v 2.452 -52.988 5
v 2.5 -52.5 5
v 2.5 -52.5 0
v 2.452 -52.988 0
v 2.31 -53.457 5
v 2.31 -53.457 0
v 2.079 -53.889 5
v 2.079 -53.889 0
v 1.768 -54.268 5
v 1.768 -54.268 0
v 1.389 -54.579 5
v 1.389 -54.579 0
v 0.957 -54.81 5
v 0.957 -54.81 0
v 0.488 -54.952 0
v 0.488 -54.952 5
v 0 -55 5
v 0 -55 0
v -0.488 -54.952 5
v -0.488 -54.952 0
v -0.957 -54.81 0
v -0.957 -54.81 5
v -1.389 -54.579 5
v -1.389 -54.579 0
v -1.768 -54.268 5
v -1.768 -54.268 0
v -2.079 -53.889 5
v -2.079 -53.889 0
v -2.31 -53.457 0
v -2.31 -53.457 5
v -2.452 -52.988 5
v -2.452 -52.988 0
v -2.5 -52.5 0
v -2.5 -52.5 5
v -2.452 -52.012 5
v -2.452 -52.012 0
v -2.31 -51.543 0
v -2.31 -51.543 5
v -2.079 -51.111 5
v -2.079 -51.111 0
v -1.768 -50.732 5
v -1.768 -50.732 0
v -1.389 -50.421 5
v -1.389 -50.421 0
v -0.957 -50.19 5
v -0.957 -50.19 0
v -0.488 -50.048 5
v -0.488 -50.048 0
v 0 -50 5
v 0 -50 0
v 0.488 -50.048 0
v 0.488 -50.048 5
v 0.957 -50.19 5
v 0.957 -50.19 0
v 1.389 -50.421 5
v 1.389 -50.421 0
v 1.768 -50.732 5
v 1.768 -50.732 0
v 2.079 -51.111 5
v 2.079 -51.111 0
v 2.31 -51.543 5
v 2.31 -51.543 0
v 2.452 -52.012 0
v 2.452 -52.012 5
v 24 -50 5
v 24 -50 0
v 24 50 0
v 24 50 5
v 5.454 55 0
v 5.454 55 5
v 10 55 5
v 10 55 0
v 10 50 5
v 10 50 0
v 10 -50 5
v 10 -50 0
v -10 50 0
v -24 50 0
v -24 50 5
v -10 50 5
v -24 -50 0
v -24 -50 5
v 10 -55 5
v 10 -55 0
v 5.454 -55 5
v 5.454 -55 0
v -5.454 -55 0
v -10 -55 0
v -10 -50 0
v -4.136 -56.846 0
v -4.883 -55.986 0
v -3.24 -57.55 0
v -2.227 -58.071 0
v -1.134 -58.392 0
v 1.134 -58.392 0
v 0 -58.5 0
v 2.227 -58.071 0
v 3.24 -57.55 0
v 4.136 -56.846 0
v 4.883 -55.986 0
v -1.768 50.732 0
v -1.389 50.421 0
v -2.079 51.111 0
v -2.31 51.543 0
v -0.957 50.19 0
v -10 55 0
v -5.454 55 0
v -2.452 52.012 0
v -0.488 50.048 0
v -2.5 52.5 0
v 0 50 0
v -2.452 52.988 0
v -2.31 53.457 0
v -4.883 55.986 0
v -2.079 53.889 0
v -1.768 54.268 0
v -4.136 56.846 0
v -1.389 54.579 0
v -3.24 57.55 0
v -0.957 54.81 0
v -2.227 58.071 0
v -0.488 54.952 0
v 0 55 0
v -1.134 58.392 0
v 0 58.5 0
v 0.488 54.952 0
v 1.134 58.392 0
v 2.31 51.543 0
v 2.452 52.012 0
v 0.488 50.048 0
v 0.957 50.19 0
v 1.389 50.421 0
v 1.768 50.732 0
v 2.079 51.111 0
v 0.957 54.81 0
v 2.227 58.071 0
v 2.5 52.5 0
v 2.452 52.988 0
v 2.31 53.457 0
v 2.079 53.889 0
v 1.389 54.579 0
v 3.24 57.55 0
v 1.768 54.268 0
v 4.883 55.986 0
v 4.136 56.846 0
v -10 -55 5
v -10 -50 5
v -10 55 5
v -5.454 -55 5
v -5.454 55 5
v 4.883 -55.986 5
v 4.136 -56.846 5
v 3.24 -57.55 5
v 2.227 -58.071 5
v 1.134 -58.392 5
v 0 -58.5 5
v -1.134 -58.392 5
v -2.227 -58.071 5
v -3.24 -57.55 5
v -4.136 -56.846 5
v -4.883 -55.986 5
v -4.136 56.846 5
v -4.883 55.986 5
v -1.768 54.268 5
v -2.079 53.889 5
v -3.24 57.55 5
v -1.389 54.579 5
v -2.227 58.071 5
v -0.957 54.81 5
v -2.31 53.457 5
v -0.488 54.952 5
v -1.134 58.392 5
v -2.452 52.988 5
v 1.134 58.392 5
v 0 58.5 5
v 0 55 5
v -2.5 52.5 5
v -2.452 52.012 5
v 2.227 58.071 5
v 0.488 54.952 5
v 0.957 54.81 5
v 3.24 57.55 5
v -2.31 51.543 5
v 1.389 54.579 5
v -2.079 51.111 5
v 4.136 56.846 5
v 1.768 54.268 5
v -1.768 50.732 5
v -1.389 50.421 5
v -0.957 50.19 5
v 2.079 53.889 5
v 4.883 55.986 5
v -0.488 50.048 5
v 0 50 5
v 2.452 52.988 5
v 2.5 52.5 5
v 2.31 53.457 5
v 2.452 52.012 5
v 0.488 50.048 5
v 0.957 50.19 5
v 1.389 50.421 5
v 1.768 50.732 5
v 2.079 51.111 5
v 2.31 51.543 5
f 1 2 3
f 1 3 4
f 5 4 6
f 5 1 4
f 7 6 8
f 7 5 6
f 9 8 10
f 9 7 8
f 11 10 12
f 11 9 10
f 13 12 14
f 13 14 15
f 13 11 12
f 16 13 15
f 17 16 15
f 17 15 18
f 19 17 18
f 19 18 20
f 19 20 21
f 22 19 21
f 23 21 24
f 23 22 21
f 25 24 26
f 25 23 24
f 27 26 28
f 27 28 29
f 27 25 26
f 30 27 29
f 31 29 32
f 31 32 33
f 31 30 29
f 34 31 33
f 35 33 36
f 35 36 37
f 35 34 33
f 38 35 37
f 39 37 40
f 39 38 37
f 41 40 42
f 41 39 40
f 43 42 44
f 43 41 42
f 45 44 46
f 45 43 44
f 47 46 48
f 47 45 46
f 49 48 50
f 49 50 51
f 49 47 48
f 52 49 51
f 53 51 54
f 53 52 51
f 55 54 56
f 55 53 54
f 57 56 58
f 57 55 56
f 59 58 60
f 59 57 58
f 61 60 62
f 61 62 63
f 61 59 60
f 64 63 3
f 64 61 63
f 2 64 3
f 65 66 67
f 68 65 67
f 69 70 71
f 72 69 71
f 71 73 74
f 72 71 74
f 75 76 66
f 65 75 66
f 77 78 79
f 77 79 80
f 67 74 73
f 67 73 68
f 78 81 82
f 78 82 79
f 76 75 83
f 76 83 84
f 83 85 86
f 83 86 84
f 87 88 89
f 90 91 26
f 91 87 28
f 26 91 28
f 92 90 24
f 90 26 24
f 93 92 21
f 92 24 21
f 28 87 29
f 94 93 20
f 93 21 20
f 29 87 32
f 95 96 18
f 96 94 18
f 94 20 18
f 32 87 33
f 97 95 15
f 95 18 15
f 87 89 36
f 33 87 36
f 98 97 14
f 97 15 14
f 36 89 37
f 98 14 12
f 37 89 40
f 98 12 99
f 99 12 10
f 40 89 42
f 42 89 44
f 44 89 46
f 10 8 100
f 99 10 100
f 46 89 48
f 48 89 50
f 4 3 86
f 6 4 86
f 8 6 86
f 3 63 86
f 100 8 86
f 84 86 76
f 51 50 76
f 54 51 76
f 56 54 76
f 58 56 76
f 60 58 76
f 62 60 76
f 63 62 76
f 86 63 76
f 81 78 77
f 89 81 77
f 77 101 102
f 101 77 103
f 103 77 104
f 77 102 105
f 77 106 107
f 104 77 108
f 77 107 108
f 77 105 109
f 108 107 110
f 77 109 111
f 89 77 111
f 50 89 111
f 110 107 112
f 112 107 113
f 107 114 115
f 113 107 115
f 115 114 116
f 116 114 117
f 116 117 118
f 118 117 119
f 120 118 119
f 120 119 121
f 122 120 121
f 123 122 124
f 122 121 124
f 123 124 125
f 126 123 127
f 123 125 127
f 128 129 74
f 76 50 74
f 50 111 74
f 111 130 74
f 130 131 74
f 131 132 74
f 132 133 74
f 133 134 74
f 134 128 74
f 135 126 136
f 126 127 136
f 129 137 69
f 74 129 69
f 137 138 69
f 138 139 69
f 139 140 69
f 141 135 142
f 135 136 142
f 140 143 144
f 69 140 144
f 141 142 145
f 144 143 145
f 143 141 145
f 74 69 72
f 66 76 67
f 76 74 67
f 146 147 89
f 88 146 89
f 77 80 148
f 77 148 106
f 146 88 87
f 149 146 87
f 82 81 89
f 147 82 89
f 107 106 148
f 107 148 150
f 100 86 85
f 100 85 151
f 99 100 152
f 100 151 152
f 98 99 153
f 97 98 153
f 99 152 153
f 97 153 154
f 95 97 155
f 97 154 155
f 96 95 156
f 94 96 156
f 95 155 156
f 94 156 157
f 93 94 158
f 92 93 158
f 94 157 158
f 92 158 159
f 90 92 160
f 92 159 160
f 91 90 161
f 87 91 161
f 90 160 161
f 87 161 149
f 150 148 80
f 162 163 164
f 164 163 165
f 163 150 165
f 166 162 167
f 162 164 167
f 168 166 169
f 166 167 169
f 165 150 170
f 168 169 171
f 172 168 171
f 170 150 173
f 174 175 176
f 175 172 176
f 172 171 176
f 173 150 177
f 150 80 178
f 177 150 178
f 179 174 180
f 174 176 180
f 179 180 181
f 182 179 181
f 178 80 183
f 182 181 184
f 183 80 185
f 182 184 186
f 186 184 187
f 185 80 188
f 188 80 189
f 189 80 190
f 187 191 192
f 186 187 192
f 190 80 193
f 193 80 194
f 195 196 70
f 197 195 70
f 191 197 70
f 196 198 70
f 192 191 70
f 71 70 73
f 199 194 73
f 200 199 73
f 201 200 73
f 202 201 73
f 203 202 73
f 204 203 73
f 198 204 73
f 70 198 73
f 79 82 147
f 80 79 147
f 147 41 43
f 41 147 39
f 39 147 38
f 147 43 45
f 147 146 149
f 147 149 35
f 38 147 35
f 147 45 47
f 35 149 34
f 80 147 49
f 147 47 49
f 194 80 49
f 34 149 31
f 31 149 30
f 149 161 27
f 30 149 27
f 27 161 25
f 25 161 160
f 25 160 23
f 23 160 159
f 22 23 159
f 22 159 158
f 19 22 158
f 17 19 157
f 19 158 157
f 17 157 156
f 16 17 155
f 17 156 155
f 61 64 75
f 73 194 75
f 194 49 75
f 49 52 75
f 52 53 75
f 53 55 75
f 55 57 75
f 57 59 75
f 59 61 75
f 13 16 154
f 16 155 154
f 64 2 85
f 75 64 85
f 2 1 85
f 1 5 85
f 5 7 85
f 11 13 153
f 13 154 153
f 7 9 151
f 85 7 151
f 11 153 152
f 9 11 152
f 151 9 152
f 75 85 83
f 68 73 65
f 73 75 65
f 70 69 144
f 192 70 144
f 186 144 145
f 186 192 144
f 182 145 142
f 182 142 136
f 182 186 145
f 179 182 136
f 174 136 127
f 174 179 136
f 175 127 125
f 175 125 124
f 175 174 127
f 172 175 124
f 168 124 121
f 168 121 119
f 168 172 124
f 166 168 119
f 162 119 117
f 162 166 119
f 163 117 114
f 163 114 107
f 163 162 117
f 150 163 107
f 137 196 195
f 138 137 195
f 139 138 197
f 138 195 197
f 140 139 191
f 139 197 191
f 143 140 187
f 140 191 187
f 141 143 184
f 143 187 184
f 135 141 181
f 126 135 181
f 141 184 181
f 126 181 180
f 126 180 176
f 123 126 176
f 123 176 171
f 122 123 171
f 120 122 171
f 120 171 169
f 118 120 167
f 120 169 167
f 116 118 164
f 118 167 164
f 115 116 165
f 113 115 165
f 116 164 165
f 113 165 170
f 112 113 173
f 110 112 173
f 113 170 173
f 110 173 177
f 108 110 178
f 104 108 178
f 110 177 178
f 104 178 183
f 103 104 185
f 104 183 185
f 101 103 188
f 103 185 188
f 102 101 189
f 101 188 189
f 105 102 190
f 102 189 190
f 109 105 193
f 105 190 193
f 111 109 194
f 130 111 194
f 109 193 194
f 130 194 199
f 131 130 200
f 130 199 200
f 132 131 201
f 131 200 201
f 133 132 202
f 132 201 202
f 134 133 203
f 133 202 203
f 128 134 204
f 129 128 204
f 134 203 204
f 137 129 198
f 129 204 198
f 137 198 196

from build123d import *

# Parameters (mm, degrees)
SKETCH1_W           = 48
SKETCH1_H           = 100
BOSS_EXTRUDE1_DEPTH = 5
SKETCH2_W           = 20
SKETCH2_H           = 5
BOSS_EXTRUDE2_DEPTH = 5
SKETCH3_R           = 6
BOSS_EXTRUDE3_DEPTH = 5
SKETCH4_R           = 2.5
CUT_EXTRUDE1_DEPTH  = 5


with BuildPart() as part:
    # Sketch1 → Boss-Extrude1 (new body)
    with BuildSketch(Plane.XY):
        Rectangle(SKETCH1_W, SKETCH1_H)
    extrude(amount=BOSS_EXTRUDE1_DEPTH)

    # Sketch2 → Boss-Extrude2 (add)
    with BuildSketch(Plane(origin=(0, 50, 0), x_dir=(1, 0, 0), z_dir=(0, 1, 0))):
        with Locations((0, -2.5)):
            Rectangle(SKETCH2_W, SKETCH2_H)
    boss_extrude2 = extrude(amount=BOSS_EXTRUDE2_DEPTH)

    # Mirror1: Boss-Extrude2 across plane
    add(boss_extrude2.mirror(Plane.ZX))

    # Sketch3 → Boss-Extrude3 (add)
    with BuildSketch(Plane.XY.offset(5)):
        with Locations((0, 52.5)):
            Circle(SKETCH3_R)
    boss_extrude3 = extrude(amount=-BOSS_EXTRUDE3_DEPTH)

    # Sketch4 → Cut-Extrude1 (cut)
    with BuildSketch(Plane.XY.offset(5)):
        with Locations((0, 52.5)):
            Circle(SKETCH4_R)
    cut_extrude1 = extrude(amount=-CUT_EXTRUDE1_DEPTH, mode=Mode.SUBTRACT)

    # Mirror2: Boss-Extrude3, Cut-Extrude1 across plane
    add(boss_extrude3.mirror(Plane.ZX))
    add(cut_extrude1.mirror(Plane.ZX), mode=Mode.SUBTRACT)


solid = part.part
